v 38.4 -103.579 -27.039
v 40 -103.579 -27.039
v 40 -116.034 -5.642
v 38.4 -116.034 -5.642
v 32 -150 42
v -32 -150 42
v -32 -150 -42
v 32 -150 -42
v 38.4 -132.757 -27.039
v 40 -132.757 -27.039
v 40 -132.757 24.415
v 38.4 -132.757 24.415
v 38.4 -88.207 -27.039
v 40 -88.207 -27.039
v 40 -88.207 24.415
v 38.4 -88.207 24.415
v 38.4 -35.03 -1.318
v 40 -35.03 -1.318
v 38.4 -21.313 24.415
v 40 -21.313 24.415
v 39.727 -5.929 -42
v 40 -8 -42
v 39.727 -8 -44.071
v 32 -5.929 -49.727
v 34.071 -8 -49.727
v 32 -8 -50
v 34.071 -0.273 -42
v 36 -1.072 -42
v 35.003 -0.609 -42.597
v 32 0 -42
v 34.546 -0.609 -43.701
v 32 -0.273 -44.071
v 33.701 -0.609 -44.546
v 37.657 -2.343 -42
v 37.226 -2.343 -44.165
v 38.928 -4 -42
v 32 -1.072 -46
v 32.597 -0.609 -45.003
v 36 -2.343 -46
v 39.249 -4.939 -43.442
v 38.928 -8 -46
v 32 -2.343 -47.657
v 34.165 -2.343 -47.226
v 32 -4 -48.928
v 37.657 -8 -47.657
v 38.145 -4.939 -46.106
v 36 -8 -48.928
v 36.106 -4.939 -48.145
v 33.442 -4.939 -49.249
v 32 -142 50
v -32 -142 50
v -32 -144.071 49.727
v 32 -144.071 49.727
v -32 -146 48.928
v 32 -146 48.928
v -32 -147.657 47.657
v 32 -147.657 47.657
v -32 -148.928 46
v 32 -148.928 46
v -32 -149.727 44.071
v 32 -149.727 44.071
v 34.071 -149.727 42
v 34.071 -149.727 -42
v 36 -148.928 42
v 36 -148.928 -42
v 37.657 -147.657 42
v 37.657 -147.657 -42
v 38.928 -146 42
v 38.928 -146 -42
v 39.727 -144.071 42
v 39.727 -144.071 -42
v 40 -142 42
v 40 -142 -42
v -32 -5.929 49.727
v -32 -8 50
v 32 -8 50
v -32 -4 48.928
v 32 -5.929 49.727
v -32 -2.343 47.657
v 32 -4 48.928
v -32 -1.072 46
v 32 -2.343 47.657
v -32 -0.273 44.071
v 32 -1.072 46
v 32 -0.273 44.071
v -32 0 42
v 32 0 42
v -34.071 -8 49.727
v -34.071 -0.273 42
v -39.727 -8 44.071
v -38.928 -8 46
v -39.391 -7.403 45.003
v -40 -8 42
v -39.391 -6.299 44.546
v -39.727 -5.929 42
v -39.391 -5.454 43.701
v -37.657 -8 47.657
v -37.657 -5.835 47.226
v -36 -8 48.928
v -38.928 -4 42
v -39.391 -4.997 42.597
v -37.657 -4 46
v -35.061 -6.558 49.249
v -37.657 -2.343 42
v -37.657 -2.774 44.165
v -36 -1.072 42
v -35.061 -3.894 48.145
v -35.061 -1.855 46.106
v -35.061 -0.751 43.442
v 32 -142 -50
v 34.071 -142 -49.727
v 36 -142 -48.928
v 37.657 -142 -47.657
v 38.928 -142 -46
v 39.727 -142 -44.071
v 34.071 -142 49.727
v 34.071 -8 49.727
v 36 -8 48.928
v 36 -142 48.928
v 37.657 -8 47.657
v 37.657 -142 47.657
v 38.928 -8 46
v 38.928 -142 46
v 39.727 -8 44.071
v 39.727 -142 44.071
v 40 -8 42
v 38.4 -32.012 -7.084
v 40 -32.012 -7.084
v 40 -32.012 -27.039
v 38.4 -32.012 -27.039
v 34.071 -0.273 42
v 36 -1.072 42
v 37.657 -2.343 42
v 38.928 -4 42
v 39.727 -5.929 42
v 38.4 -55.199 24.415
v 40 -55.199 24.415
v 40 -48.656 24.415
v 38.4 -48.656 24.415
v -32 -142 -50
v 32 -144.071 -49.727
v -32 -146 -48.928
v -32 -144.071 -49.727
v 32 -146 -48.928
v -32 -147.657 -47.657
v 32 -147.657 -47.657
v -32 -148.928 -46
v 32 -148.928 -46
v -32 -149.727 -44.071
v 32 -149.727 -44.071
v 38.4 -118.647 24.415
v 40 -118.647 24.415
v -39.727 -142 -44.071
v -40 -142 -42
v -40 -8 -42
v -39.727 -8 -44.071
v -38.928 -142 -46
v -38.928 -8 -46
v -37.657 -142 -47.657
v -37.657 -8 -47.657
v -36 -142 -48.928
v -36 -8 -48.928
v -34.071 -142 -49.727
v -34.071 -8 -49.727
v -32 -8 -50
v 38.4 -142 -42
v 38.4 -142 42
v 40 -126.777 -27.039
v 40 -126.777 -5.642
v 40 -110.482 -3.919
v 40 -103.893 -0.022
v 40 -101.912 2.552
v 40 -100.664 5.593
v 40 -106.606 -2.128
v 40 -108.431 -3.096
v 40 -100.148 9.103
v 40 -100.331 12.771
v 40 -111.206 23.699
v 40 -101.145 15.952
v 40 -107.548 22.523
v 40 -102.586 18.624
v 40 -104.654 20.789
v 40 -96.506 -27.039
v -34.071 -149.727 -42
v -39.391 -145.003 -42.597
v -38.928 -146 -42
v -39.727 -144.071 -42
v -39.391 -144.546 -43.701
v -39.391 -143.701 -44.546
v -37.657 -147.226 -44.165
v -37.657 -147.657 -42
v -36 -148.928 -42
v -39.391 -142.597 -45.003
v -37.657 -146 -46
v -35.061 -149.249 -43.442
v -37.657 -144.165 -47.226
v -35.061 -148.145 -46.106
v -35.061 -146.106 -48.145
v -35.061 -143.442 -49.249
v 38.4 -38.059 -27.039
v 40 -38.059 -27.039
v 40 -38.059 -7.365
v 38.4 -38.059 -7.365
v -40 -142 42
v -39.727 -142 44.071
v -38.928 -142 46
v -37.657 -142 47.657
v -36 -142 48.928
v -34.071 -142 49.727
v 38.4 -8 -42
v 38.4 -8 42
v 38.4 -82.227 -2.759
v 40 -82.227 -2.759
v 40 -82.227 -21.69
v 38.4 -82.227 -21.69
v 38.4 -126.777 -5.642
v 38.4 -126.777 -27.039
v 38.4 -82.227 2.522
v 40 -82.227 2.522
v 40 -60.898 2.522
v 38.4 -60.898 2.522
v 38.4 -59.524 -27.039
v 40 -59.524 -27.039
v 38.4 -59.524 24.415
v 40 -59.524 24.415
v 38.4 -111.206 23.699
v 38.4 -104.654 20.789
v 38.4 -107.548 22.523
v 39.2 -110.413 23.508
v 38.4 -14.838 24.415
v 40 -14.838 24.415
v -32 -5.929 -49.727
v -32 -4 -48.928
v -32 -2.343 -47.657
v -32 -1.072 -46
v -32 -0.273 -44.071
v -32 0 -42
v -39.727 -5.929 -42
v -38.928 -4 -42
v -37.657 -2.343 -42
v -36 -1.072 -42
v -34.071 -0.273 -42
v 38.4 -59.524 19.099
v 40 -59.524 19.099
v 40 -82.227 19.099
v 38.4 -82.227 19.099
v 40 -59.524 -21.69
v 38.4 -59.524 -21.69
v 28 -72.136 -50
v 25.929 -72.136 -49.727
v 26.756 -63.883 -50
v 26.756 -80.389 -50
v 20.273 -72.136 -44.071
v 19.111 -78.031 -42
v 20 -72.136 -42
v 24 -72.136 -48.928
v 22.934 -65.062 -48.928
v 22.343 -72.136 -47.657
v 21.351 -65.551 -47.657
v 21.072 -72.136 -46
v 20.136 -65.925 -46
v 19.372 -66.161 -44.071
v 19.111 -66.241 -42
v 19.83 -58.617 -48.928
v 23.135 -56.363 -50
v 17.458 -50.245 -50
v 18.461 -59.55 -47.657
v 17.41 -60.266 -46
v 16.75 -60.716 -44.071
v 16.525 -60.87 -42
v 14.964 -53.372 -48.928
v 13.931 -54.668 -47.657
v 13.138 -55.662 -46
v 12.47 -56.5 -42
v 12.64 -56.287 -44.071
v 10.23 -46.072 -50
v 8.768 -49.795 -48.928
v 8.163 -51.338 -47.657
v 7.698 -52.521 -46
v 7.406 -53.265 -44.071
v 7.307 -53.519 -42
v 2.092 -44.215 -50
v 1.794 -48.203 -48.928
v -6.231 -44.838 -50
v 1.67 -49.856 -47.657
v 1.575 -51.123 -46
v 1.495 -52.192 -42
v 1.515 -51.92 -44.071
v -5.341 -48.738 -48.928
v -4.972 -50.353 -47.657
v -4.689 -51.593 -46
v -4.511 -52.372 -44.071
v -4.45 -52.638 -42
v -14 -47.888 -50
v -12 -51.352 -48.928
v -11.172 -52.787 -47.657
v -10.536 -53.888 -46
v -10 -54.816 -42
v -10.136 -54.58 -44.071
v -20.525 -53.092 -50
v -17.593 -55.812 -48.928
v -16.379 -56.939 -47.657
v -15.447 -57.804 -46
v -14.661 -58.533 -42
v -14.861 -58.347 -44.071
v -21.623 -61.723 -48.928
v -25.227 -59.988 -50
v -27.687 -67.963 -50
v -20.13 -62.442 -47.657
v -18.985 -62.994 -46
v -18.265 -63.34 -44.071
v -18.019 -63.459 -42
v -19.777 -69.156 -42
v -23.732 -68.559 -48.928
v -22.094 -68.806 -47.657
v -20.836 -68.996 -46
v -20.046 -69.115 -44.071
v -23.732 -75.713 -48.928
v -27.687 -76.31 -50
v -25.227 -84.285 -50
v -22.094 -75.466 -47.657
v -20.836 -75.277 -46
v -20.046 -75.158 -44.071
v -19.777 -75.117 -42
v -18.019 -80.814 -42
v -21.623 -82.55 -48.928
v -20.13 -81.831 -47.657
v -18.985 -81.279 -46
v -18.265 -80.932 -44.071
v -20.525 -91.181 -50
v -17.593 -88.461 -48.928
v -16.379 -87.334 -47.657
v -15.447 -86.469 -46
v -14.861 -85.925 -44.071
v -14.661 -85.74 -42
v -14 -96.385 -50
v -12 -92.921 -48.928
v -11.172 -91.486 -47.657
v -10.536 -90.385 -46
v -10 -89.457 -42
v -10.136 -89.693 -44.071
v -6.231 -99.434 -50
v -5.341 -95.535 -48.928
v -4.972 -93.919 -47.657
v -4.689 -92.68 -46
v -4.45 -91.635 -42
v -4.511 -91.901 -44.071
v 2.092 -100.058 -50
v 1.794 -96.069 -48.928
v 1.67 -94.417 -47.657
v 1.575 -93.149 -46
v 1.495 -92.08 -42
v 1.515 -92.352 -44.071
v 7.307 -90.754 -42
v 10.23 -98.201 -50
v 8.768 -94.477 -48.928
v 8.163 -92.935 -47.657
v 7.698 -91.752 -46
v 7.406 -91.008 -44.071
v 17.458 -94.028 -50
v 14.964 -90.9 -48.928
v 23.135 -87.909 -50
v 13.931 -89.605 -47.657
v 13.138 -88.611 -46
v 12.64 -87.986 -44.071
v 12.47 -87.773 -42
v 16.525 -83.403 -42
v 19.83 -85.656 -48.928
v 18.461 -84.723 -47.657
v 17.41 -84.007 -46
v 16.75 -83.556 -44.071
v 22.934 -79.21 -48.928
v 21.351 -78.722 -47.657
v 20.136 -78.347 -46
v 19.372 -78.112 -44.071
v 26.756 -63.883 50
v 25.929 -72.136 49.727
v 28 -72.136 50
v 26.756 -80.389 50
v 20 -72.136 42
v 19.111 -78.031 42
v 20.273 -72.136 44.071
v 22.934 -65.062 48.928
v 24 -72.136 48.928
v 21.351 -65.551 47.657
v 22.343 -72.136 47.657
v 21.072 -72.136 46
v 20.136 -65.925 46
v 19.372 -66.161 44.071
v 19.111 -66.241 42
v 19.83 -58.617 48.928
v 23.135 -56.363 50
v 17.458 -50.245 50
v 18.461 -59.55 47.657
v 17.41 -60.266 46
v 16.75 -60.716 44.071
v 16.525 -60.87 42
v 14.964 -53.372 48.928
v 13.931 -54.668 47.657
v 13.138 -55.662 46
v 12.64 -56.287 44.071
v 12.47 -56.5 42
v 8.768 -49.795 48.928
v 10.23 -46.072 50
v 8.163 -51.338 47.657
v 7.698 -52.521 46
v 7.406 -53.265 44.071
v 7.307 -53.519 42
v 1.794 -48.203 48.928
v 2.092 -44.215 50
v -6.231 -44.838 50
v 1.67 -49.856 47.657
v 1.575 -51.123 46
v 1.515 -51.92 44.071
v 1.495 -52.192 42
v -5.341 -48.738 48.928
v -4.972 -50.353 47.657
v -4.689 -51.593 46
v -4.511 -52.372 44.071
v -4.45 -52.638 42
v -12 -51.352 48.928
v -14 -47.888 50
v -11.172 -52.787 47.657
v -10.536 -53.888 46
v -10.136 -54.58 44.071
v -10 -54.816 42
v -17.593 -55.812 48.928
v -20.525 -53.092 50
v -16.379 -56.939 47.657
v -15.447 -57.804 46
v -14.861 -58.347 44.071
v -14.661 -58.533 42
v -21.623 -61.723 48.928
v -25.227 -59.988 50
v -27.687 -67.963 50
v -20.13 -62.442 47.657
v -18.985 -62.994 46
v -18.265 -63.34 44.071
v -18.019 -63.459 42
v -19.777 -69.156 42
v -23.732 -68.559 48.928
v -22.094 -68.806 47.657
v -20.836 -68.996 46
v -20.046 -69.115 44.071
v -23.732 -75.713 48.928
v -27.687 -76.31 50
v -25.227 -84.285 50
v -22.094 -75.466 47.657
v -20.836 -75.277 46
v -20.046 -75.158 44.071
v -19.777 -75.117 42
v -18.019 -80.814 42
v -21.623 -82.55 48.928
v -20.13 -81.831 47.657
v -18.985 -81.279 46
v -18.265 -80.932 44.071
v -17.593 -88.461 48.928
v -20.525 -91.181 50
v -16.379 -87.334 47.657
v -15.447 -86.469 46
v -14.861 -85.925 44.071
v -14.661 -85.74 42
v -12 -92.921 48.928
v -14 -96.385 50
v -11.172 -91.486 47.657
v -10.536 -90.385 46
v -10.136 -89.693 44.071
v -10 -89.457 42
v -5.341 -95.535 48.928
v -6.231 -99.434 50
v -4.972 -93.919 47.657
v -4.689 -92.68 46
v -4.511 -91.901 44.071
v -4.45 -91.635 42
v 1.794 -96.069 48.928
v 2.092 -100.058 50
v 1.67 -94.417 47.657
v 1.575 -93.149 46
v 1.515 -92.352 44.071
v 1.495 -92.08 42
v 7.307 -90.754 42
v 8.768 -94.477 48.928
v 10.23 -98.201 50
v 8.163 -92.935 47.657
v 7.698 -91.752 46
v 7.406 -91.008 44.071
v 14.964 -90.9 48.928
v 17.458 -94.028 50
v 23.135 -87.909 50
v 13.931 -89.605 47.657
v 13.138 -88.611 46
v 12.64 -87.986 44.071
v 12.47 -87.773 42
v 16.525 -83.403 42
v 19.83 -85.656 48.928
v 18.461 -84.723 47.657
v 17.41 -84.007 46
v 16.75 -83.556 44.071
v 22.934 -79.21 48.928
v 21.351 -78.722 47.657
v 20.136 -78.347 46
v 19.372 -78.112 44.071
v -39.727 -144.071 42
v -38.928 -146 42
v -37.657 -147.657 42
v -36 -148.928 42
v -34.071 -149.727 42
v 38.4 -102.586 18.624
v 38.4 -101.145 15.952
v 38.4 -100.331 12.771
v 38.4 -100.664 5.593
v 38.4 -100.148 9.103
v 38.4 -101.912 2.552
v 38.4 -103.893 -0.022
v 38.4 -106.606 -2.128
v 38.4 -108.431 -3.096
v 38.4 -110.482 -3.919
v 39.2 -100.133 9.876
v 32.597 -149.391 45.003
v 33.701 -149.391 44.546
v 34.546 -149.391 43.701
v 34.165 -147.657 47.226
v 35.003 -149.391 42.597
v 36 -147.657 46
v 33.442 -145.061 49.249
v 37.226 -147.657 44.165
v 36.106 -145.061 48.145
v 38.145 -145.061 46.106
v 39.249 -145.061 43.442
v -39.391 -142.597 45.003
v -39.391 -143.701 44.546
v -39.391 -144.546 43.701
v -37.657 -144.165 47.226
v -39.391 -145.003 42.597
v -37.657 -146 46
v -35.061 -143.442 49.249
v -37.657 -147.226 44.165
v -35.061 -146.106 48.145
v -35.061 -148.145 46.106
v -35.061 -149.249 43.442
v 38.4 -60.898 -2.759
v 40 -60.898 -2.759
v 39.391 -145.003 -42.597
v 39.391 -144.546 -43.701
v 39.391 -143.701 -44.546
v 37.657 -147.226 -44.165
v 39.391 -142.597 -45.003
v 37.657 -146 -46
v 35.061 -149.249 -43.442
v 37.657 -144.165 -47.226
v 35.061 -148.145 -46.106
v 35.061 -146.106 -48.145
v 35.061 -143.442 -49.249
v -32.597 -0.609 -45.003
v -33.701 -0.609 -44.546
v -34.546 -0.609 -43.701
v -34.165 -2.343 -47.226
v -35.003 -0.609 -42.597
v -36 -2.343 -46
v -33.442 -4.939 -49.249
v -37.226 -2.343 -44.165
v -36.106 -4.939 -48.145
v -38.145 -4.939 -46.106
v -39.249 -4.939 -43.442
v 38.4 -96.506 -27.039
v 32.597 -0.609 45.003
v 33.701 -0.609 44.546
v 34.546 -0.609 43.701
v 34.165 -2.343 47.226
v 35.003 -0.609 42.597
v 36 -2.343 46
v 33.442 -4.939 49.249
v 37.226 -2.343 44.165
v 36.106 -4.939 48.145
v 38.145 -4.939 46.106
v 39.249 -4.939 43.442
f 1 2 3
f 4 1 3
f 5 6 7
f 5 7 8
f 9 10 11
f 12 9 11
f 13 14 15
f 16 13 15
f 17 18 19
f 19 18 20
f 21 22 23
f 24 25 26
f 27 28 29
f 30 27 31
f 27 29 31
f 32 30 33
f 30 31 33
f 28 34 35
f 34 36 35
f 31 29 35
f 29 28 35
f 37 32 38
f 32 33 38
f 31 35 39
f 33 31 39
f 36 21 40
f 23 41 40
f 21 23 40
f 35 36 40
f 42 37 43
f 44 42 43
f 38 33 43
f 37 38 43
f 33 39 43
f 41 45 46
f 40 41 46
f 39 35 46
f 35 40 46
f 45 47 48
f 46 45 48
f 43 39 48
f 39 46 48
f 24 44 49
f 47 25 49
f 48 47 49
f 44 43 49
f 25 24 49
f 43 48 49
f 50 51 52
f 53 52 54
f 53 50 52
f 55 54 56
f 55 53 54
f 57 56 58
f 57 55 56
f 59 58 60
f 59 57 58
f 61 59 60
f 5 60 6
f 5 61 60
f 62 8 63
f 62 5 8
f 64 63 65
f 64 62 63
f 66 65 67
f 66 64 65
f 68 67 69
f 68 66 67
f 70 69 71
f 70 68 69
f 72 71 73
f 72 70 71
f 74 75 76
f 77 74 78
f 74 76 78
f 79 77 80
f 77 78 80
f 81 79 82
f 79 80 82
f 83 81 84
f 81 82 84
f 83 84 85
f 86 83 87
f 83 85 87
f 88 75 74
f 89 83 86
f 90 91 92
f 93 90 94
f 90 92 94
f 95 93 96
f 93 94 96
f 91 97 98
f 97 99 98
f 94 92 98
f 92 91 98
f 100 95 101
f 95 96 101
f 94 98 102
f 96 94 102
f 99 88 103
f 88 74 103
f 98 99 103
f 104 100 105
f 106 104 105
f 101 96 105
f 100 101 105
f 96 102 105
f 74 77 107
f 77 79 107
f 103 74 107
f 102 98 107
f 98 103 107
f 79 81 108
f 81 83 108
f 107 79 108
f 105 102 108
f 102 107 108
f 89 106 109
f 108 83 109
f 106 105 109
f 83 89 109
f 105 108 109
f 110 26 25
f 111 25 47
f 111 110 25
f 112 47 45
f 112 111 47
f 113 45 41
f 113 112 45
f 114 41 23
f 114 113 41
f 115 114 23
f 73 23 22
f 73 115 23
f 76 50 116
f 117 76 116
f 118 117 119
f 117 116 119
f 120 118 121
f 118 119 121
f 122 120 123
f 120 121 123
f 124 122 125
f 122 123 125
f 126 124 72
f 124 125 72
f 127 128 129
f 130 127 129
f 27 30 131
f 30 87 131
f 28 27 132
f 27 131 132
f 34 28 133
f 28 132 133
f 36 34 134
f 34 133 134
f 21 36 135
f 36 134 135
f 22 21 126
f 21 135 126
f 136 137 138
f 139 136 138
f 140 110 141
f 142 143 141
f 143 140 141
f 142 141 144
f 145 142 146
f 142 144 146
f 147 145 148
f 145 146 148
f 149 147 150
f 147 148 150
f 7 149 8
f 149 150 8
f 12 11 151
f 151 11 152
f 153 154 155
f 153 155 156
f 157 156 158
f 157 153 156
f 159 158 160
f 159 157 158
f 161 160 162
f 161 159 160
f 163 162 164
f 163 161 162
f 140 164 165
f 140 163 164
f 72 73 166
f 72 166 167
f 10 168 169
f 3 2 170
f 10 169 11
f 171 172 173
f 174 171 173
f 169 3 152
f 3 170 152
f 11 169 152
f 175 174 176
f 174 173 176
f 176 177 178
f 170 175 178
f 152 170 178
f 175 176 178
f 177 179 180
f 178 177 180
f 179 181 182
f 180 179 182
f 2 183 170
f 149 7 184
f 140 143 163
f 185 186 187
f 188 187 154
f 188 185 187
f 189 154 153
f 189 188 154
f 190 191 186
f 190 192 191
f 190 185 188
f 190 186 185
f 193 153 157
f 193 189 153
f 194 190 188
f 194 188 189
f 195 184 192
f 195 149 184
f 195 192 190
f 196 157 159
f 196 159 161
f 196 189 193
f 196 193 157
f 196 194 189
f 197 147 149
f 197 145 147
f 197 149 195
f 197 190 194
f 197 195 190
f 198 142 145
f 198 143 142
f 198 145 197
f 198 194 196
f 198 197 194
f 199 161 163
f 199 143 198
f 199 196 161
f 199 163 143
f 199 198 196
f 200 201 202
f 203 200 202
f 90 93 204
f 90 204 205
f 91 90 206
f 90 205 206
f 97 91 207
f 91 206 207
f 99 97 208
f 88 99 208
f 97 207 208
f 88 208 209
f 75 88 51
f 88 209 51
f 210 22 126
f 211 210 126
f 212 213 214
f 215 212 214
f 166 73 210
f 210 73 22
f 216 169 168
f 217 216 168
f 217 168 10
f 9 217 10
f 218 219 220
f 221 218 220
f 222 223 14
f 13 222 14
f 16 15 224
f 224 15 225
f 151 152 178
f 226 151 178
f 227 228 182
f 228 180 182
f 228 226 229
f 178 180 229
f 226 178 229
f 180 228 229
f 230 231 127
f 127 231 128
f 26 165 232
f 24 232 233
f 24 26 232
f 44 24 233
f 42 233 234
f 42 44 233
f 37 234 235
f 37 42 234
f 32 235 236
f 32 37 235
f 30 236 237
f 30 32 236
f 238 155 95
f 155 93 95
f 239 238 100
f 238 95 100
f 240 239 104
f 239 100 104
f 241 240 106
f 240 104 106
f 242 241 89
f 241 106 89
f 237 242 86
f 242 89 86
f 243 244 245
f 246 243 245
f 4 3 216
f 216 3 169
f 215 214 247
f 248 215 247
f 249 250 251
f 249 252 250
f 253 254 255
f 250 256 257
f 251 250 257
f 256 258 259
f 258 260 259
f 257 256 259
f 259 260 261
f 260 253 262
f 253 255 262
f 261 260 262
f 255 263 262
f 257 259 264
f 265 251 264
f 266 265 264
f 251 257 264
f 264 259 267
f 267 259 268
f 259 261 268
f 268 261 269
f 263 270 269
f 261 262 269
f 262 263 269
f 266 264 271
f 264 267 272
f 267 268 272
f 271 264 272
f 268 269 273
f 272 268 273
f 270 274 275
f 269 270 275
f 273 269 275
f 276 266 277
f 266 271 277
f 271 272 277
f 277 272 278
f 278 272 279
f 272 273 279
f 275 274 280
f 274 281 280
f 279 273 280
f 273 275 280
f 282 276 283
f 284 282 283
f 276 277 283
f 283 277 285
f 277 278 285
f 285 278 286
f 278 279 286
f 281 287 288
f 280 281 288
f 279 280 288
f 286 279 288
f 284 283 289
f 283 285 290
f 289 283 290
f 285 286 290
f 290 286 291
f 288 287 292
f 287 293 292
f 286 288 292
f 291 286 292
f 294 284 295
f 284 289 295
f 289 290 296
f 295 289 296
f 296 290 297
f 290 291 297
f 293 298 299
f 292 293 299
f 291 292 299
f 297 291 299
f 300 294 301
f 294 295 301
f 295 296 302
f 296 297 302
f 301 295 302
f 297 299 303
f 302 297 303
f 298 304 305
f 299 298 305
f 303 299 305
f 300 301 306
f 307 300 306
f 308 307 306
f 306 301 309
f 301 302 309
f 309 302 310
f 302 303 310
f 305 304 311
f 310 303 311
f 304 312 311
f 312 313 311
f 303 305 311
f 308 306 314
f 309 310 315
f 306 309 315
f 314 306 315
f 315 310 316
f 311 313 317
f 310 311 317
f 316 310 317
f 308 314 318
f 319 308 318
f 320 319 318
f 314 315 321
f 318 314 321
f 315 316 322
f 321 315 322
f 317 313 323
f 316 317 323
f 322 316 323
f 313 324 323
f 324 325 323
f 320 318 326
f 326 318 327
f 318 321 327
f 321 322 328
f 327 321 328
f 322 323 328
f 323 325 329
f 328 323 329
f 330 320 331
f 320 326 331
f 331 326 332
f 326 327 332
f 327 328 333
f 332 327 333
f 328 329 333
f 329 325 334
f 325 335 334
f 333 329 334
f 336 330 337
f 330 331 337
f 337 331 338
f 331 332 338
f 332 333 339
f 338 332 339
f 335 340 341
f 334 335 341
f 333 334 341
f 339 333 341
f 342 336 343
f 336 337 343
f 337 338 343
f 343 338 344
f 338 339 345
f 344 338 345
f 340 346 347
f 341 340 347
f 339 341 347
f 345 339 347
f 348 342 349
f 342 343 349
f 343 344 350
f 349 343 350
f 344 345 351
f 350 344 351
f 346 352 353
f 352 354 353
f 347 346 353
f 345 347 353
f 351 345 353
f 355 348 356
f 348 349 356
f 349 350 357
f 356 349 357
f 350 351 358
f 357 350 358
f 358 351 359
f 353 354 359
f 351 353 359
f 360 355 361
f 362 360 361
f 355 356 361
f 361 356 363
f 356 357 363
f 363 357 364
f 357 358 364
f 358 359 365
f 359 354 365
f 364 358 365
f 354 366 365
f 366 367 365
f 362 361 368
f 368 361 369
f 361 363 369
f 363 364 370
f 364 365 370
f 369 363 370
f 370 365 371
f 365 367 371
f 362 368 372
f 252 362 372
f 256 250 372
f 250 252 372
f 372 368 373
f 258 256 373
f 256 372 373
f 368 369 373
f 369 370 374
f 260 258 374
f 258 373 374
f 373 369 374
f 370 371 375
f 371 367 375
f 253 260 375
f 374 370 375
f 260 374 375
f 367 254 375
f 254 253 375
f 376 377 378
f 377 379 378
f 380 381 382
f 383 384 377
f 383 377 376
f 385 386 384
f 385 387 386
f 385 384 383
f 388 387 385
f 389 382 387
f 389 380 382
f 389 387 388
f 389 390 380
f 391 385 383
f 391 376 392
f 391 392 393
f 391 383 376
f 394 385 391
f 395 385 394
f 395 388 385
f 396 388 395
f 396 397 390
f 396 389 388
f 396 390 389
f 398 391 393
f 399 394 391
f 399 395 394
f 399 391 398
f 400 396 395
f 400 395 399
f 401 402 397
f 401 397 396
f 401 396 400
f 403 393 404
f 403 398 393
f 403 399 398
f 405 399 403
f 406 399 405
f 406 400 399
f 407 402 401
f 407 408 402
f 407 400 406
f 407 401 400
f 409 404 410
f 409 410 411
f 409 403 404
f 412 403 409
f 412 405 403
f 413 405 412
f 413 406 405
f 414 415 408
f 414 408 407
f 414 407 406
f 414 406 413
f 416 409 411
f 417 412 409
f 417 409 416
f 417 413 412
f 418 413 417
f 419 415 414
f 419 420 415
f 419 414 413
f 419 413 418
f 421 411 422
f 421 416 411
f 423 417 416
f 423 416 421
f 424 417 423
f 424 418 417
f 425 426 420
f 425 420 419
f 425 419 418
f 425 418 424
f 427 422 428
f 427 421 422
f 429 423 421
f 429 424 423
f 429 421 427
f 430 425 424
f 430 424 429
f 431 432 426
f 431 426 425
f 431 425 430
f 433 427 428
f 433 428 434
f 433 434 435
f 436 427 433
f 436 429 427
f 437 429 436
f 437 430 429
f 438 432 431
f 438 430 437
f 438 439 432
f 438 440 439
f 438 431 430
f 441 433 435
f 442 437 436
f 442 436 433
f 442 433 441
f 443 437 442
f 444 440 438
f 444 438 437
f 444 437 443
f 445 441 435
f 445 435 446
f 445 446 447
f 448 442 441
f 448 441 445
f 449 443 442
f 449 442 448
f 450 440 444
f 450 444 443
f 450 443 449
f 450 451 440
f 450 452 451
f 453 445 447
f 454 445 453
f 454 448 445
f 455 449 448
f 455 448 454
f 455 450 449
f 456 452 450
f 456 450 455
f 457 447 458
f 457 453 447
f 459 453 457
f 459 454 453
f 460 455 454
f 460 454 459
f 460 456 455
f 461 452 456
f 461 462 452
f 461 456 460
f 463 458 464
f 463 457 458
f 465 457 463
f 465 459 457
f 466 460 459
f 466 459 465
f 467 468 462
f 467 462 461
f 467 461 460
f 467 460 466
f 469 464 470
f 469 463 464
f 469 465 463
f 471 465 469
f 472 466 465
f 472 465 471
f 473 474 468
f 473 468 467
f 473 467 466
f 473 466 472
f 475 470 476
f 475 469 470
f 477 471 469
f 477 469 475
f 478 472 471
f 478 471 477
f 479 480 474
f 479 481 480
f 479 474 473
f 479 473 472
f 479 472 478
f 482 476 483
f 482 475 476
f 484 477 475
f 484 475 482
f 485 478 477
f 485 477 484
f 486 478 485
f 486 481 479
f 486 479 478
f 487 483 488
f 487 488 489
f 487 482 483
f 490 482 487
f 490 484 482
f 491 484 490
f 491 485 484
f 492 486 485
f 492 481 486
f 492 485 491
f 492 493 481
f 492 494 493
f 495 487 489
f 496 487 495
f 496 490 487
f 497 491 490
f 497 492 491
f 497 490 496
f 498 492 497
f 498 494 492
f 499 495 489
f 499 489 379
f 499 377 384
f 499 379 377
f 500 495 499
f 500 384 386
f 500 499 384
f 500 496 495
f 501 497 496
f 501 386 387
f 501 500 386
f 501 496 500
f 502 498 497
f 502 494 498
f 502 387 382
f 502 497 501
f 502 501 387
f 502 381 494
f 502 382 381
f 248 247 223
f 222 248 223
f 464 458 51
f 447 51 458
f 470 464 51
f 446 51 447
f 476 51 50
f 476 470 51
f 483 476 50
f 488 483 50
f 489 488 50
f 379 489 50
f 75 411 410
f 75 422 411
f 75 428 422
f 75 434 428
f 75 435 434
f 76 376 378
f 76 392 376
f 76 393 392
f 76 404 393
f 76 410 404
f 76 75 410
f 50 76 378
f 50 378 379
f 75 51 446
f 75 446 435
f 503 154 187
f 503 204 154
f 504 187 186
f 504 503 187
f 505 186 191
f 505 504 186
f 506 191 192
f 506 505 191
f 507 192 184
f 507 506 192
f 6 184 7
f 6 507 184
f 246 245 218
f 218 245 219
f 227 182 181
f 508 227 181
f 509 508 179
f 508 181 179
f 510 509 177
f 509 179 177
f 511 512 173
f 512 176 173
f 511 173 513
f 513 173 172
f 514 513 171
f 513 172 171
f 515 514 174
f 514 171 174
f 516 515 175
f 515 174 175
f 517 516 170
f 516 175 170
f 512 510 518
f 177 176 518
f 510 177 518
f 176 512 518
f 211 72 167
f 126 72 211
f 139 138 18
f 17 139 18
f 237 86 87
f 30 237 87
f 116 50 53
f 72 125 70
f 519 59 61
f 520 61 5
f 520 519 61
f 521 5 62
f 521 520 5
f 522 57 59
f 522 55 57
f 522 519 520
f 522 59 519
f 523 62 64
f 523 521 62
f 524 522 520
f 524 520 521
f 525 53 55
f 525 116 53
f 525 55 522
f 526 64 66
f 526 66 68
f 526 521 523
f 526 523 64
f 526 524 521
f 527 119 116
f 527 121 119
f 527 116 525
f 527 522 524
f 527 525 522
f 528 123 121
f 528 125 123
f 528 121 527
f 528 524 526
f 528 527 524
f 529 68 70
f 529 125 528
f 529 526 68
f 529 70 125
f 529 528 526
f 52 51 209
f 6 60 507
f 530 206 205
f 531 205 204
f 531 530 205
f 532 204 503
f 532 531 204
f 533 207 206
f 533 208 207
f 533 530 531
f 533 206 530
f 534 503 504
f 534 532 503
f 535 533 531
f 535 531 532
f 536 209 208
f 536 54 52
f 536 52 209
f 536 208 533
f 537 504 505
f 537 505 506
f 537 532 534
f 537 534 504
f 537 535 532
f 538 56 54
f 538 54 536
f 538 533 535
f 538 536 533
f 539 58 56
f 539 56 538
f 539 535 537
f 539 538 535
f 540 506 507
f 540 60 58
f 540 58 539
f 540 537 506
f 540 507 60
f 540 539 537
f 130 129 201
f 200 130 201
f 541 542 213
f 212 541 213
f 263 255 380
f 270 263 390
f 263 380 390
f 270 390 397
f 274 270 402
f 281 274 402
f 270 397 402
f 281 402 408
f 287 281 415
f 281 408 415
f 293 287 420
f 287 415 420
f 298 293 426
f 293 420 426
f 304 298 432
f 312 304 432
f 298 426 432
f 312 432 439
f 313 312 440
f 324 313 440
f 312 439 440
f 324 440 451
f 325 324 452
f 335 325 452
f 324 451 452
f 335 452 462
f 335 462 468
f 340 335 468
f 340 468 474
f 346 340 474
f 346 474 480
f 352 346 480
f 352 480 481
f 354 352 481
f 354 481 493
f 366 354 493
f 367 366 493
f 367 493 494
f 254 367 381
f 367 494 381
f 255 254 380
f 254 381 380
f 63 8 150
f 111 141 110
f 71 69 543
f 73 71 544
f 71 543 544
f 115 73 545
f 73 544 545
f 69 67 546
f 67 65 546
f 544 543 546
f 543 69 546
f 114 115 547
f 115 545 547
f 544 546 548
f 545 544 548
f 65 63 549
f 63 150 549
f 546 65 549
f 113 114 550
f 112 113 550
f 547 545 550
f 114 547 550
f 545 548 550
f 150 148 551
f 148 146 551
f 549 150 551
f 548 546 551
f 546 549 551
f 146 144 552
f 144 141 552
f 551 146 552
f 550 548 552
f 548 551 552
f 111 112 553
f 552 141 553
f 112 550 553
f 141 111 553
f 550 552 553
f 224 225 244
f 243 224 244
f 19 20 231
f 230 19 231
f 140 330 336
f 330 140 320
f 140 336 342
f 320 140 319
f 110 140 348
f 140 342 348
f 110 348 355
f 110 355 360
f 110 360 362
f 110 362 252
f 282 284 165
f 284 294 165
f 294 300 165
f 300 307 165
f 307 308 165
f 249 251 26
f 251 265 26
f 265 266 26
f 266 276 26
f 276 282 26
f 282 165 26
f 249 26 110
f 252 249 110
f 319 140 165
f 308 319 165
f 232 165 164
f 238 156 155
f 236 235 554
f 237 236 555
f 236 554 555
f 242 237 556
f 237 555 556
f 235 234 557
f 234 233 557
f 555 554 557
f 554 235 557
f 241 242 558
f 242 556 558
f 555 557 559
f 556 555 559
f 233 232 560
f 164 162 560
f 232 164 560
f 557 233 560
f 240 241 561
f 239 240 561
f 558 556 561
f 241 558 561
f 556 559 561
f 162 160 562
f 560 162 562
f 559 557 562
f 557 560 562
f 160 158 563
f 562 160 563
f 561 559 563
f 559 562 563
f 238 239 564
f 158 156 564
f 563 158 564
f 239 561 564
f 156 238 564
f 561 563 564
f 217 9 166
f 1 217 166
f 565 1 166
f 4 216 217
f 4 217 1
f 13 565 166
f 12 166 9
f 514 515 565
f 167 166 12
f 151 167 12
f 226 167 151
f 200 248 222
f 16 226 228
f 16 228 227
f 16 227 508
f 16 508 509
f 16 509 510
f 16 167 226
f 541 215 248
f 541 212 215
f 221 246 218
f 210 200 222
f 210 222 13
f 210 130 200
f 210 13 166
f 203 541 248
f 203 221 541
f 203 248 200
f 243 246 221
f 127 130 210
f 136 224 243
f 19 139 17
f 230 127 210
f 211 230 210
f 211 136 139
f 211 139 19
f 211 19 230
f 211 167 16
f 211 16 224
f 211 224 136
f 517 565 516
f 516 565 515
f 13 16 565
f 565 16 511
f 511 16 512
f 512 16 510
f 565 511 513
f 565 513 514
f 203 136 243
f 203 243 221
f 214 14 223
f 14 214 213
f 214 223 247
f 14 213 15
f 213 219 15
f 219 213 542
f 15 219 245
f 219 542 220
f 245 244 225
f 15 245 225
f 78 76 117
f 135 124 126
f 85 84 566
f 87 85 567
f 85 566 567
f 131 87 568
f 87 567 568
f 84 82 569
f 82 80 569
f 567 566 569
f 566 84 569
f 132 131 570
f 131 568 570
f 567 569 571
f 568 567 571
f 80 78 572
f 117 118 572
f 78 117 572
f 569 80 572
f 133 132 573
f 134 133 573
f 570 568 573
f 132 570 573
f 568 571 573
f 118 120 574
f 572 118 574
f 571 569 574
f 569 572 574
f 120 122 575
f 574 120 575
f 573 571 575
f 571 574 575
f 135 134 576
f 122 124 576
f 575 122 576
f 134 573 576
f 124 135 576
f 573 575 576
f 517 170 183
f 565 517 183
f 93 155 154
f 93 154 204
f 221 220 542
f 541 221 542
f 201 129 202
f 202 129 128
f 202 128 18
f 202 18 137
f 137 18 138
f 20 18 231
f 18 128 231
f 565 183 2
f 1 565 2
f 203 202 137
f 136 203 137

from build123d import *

# Parameters (mm, degrees)
F0_W     = 80
F0_H     = 100
F1_DEPTH = 150
F2_R     = 20
F3_DEPTH = 141.9
F4_R     = 8
F5_W     = 134
F5_H     = 84
F6_DEPTH = 1.6


with BuildPart() as f1:
    # F0 (on Front) → F1 (new body)
    with BuildSketch(Plane.XZ):
        Rectangle(F0_W, F0_H)
    extrude(amount=F1_DEPTH)

    # F2 (on face) → F3 (cut, symmetric)
    with BuildSketch(Plane.XY.offset(50)):
        with Locations((0, -72.1363547525)):
            Circle(F2_R)
    extrude(amount=F3_DEPTH, both=True, mode=Mode.SUBTRACT)

    # F4
    f4_edges = [f1.edges().sort_by_distance(p)[0] for p in [
        (40, -75, 50),
        (0, 0, 50),
        (0, -150, 50),
        (-40, -75, 50),
        (-20, -72.136355, 50),
        (0, -150, -50),
        (40, -150, 0),
        (-40, -150, 0),
        (40, -75, -50),
        (40, 0, 0),
        (-40, -75, -50),
        (0, 0, -50),
        (-20, -72.136355, -50),
        (-40, 0, 0),
    ]]
    fillet(f4_edges, radius=F4_R)

    # F5 (on face) → F6 (cut)
    with BuildSketch(Plane.YZ.offset(40)):
        with Locations((-75, 0)):
            Rectangle(F5_W, F5_H)
        with BuildLine():
            Line((-116.0339047565, -5.6421386253), (-126.7773912041, -5.6421386253))
            Line((-126.7773912041, -5.6421386253), (-126.7773912041, -27.0390193909))
            Line((-126.7773912041, -27.0390193909), (-132.7572563023, -27.0390193909))
            Line((-132.7572563023, -27.0390193909), (-132.7572563023, 24.4148480924))
            Line((-132.7572563023, 24.4148480924), (-118.6465765131, 24.4148480924))
            add(Edge.make_bspline(
                [(-118.6465765131, 24.4148480924), (-109.1756413953, 24.4148480924), (-104.654142644, 20.7886398784)],
                knots=[0, 0, 0, 1, 1, 1], degree=2))
            add(Edge.make_bspline(
                [(-104.654142644, 20.7886398784), (-100.1326438927, 17.1624316645), (-100.1326438927, 9.876230688)],
                knots=[0, 0, 0, 1, 1, 1], degree=2))
            add(Edge.make_bspline(
                [(-100.1326438927, 9.876230688), (-100.1326438927, -0.3267029824), (-110.4819772736, -3.9191266478)],
                knots=[0, 0, 0, 1, 1, 1], degree=2))
            Line((-110.4819772736, -3.9191266478), (-96.5064356787, -27.0390193909))
            Line((-96.5064356787, -27.0390193909), (-103.5786678476, -27.0390193909))
            Line((-103.5786678476, -27.0390193909), (-116.0339047565, -5.6421386253))
        make_face(mode=Mode.SUBTRACT)
        Polygon((-59.5236165027, -21.6897991995), (-59.5236165027, -27.0390193909), (-88.2066982449, -27.0390193909), (-88.2066982449, 24.4148480924), (-59.5236165027, 24.4148480924), (-59.5236165027, 19.0994124496), (-82.2268331467, 19.0994124496), (-82.2268331467, 2.5224606143), (-60.8975214782, 2.5224606143), (-60.8975214782, -2.75919048), (-82.2268331467, -2.75919048), (-82.2268331467, -21.6897991995), align=None, mode=Mode.SUBTRACT)
        Polygon((-48.656253377, 24.4148480924), (-35.0298187841, -1.3177164074), (-21.3132920617, 24.4148480924), (-14.837920251, 24.4148480924), (-32.0117324445, -7.0836126979), (-32.0117324445, -27.0390193909), (-38.0591666399, -27.0390193909), (-38.0591666399, -7.3651506027), (-55.1991942848, 24.4148480924), align=None, mode=Mode.SUBTRACT)
    extrude(amount=-F6_DEPTH, mode=Mode.SUBTRACT)


solid = f1.part
